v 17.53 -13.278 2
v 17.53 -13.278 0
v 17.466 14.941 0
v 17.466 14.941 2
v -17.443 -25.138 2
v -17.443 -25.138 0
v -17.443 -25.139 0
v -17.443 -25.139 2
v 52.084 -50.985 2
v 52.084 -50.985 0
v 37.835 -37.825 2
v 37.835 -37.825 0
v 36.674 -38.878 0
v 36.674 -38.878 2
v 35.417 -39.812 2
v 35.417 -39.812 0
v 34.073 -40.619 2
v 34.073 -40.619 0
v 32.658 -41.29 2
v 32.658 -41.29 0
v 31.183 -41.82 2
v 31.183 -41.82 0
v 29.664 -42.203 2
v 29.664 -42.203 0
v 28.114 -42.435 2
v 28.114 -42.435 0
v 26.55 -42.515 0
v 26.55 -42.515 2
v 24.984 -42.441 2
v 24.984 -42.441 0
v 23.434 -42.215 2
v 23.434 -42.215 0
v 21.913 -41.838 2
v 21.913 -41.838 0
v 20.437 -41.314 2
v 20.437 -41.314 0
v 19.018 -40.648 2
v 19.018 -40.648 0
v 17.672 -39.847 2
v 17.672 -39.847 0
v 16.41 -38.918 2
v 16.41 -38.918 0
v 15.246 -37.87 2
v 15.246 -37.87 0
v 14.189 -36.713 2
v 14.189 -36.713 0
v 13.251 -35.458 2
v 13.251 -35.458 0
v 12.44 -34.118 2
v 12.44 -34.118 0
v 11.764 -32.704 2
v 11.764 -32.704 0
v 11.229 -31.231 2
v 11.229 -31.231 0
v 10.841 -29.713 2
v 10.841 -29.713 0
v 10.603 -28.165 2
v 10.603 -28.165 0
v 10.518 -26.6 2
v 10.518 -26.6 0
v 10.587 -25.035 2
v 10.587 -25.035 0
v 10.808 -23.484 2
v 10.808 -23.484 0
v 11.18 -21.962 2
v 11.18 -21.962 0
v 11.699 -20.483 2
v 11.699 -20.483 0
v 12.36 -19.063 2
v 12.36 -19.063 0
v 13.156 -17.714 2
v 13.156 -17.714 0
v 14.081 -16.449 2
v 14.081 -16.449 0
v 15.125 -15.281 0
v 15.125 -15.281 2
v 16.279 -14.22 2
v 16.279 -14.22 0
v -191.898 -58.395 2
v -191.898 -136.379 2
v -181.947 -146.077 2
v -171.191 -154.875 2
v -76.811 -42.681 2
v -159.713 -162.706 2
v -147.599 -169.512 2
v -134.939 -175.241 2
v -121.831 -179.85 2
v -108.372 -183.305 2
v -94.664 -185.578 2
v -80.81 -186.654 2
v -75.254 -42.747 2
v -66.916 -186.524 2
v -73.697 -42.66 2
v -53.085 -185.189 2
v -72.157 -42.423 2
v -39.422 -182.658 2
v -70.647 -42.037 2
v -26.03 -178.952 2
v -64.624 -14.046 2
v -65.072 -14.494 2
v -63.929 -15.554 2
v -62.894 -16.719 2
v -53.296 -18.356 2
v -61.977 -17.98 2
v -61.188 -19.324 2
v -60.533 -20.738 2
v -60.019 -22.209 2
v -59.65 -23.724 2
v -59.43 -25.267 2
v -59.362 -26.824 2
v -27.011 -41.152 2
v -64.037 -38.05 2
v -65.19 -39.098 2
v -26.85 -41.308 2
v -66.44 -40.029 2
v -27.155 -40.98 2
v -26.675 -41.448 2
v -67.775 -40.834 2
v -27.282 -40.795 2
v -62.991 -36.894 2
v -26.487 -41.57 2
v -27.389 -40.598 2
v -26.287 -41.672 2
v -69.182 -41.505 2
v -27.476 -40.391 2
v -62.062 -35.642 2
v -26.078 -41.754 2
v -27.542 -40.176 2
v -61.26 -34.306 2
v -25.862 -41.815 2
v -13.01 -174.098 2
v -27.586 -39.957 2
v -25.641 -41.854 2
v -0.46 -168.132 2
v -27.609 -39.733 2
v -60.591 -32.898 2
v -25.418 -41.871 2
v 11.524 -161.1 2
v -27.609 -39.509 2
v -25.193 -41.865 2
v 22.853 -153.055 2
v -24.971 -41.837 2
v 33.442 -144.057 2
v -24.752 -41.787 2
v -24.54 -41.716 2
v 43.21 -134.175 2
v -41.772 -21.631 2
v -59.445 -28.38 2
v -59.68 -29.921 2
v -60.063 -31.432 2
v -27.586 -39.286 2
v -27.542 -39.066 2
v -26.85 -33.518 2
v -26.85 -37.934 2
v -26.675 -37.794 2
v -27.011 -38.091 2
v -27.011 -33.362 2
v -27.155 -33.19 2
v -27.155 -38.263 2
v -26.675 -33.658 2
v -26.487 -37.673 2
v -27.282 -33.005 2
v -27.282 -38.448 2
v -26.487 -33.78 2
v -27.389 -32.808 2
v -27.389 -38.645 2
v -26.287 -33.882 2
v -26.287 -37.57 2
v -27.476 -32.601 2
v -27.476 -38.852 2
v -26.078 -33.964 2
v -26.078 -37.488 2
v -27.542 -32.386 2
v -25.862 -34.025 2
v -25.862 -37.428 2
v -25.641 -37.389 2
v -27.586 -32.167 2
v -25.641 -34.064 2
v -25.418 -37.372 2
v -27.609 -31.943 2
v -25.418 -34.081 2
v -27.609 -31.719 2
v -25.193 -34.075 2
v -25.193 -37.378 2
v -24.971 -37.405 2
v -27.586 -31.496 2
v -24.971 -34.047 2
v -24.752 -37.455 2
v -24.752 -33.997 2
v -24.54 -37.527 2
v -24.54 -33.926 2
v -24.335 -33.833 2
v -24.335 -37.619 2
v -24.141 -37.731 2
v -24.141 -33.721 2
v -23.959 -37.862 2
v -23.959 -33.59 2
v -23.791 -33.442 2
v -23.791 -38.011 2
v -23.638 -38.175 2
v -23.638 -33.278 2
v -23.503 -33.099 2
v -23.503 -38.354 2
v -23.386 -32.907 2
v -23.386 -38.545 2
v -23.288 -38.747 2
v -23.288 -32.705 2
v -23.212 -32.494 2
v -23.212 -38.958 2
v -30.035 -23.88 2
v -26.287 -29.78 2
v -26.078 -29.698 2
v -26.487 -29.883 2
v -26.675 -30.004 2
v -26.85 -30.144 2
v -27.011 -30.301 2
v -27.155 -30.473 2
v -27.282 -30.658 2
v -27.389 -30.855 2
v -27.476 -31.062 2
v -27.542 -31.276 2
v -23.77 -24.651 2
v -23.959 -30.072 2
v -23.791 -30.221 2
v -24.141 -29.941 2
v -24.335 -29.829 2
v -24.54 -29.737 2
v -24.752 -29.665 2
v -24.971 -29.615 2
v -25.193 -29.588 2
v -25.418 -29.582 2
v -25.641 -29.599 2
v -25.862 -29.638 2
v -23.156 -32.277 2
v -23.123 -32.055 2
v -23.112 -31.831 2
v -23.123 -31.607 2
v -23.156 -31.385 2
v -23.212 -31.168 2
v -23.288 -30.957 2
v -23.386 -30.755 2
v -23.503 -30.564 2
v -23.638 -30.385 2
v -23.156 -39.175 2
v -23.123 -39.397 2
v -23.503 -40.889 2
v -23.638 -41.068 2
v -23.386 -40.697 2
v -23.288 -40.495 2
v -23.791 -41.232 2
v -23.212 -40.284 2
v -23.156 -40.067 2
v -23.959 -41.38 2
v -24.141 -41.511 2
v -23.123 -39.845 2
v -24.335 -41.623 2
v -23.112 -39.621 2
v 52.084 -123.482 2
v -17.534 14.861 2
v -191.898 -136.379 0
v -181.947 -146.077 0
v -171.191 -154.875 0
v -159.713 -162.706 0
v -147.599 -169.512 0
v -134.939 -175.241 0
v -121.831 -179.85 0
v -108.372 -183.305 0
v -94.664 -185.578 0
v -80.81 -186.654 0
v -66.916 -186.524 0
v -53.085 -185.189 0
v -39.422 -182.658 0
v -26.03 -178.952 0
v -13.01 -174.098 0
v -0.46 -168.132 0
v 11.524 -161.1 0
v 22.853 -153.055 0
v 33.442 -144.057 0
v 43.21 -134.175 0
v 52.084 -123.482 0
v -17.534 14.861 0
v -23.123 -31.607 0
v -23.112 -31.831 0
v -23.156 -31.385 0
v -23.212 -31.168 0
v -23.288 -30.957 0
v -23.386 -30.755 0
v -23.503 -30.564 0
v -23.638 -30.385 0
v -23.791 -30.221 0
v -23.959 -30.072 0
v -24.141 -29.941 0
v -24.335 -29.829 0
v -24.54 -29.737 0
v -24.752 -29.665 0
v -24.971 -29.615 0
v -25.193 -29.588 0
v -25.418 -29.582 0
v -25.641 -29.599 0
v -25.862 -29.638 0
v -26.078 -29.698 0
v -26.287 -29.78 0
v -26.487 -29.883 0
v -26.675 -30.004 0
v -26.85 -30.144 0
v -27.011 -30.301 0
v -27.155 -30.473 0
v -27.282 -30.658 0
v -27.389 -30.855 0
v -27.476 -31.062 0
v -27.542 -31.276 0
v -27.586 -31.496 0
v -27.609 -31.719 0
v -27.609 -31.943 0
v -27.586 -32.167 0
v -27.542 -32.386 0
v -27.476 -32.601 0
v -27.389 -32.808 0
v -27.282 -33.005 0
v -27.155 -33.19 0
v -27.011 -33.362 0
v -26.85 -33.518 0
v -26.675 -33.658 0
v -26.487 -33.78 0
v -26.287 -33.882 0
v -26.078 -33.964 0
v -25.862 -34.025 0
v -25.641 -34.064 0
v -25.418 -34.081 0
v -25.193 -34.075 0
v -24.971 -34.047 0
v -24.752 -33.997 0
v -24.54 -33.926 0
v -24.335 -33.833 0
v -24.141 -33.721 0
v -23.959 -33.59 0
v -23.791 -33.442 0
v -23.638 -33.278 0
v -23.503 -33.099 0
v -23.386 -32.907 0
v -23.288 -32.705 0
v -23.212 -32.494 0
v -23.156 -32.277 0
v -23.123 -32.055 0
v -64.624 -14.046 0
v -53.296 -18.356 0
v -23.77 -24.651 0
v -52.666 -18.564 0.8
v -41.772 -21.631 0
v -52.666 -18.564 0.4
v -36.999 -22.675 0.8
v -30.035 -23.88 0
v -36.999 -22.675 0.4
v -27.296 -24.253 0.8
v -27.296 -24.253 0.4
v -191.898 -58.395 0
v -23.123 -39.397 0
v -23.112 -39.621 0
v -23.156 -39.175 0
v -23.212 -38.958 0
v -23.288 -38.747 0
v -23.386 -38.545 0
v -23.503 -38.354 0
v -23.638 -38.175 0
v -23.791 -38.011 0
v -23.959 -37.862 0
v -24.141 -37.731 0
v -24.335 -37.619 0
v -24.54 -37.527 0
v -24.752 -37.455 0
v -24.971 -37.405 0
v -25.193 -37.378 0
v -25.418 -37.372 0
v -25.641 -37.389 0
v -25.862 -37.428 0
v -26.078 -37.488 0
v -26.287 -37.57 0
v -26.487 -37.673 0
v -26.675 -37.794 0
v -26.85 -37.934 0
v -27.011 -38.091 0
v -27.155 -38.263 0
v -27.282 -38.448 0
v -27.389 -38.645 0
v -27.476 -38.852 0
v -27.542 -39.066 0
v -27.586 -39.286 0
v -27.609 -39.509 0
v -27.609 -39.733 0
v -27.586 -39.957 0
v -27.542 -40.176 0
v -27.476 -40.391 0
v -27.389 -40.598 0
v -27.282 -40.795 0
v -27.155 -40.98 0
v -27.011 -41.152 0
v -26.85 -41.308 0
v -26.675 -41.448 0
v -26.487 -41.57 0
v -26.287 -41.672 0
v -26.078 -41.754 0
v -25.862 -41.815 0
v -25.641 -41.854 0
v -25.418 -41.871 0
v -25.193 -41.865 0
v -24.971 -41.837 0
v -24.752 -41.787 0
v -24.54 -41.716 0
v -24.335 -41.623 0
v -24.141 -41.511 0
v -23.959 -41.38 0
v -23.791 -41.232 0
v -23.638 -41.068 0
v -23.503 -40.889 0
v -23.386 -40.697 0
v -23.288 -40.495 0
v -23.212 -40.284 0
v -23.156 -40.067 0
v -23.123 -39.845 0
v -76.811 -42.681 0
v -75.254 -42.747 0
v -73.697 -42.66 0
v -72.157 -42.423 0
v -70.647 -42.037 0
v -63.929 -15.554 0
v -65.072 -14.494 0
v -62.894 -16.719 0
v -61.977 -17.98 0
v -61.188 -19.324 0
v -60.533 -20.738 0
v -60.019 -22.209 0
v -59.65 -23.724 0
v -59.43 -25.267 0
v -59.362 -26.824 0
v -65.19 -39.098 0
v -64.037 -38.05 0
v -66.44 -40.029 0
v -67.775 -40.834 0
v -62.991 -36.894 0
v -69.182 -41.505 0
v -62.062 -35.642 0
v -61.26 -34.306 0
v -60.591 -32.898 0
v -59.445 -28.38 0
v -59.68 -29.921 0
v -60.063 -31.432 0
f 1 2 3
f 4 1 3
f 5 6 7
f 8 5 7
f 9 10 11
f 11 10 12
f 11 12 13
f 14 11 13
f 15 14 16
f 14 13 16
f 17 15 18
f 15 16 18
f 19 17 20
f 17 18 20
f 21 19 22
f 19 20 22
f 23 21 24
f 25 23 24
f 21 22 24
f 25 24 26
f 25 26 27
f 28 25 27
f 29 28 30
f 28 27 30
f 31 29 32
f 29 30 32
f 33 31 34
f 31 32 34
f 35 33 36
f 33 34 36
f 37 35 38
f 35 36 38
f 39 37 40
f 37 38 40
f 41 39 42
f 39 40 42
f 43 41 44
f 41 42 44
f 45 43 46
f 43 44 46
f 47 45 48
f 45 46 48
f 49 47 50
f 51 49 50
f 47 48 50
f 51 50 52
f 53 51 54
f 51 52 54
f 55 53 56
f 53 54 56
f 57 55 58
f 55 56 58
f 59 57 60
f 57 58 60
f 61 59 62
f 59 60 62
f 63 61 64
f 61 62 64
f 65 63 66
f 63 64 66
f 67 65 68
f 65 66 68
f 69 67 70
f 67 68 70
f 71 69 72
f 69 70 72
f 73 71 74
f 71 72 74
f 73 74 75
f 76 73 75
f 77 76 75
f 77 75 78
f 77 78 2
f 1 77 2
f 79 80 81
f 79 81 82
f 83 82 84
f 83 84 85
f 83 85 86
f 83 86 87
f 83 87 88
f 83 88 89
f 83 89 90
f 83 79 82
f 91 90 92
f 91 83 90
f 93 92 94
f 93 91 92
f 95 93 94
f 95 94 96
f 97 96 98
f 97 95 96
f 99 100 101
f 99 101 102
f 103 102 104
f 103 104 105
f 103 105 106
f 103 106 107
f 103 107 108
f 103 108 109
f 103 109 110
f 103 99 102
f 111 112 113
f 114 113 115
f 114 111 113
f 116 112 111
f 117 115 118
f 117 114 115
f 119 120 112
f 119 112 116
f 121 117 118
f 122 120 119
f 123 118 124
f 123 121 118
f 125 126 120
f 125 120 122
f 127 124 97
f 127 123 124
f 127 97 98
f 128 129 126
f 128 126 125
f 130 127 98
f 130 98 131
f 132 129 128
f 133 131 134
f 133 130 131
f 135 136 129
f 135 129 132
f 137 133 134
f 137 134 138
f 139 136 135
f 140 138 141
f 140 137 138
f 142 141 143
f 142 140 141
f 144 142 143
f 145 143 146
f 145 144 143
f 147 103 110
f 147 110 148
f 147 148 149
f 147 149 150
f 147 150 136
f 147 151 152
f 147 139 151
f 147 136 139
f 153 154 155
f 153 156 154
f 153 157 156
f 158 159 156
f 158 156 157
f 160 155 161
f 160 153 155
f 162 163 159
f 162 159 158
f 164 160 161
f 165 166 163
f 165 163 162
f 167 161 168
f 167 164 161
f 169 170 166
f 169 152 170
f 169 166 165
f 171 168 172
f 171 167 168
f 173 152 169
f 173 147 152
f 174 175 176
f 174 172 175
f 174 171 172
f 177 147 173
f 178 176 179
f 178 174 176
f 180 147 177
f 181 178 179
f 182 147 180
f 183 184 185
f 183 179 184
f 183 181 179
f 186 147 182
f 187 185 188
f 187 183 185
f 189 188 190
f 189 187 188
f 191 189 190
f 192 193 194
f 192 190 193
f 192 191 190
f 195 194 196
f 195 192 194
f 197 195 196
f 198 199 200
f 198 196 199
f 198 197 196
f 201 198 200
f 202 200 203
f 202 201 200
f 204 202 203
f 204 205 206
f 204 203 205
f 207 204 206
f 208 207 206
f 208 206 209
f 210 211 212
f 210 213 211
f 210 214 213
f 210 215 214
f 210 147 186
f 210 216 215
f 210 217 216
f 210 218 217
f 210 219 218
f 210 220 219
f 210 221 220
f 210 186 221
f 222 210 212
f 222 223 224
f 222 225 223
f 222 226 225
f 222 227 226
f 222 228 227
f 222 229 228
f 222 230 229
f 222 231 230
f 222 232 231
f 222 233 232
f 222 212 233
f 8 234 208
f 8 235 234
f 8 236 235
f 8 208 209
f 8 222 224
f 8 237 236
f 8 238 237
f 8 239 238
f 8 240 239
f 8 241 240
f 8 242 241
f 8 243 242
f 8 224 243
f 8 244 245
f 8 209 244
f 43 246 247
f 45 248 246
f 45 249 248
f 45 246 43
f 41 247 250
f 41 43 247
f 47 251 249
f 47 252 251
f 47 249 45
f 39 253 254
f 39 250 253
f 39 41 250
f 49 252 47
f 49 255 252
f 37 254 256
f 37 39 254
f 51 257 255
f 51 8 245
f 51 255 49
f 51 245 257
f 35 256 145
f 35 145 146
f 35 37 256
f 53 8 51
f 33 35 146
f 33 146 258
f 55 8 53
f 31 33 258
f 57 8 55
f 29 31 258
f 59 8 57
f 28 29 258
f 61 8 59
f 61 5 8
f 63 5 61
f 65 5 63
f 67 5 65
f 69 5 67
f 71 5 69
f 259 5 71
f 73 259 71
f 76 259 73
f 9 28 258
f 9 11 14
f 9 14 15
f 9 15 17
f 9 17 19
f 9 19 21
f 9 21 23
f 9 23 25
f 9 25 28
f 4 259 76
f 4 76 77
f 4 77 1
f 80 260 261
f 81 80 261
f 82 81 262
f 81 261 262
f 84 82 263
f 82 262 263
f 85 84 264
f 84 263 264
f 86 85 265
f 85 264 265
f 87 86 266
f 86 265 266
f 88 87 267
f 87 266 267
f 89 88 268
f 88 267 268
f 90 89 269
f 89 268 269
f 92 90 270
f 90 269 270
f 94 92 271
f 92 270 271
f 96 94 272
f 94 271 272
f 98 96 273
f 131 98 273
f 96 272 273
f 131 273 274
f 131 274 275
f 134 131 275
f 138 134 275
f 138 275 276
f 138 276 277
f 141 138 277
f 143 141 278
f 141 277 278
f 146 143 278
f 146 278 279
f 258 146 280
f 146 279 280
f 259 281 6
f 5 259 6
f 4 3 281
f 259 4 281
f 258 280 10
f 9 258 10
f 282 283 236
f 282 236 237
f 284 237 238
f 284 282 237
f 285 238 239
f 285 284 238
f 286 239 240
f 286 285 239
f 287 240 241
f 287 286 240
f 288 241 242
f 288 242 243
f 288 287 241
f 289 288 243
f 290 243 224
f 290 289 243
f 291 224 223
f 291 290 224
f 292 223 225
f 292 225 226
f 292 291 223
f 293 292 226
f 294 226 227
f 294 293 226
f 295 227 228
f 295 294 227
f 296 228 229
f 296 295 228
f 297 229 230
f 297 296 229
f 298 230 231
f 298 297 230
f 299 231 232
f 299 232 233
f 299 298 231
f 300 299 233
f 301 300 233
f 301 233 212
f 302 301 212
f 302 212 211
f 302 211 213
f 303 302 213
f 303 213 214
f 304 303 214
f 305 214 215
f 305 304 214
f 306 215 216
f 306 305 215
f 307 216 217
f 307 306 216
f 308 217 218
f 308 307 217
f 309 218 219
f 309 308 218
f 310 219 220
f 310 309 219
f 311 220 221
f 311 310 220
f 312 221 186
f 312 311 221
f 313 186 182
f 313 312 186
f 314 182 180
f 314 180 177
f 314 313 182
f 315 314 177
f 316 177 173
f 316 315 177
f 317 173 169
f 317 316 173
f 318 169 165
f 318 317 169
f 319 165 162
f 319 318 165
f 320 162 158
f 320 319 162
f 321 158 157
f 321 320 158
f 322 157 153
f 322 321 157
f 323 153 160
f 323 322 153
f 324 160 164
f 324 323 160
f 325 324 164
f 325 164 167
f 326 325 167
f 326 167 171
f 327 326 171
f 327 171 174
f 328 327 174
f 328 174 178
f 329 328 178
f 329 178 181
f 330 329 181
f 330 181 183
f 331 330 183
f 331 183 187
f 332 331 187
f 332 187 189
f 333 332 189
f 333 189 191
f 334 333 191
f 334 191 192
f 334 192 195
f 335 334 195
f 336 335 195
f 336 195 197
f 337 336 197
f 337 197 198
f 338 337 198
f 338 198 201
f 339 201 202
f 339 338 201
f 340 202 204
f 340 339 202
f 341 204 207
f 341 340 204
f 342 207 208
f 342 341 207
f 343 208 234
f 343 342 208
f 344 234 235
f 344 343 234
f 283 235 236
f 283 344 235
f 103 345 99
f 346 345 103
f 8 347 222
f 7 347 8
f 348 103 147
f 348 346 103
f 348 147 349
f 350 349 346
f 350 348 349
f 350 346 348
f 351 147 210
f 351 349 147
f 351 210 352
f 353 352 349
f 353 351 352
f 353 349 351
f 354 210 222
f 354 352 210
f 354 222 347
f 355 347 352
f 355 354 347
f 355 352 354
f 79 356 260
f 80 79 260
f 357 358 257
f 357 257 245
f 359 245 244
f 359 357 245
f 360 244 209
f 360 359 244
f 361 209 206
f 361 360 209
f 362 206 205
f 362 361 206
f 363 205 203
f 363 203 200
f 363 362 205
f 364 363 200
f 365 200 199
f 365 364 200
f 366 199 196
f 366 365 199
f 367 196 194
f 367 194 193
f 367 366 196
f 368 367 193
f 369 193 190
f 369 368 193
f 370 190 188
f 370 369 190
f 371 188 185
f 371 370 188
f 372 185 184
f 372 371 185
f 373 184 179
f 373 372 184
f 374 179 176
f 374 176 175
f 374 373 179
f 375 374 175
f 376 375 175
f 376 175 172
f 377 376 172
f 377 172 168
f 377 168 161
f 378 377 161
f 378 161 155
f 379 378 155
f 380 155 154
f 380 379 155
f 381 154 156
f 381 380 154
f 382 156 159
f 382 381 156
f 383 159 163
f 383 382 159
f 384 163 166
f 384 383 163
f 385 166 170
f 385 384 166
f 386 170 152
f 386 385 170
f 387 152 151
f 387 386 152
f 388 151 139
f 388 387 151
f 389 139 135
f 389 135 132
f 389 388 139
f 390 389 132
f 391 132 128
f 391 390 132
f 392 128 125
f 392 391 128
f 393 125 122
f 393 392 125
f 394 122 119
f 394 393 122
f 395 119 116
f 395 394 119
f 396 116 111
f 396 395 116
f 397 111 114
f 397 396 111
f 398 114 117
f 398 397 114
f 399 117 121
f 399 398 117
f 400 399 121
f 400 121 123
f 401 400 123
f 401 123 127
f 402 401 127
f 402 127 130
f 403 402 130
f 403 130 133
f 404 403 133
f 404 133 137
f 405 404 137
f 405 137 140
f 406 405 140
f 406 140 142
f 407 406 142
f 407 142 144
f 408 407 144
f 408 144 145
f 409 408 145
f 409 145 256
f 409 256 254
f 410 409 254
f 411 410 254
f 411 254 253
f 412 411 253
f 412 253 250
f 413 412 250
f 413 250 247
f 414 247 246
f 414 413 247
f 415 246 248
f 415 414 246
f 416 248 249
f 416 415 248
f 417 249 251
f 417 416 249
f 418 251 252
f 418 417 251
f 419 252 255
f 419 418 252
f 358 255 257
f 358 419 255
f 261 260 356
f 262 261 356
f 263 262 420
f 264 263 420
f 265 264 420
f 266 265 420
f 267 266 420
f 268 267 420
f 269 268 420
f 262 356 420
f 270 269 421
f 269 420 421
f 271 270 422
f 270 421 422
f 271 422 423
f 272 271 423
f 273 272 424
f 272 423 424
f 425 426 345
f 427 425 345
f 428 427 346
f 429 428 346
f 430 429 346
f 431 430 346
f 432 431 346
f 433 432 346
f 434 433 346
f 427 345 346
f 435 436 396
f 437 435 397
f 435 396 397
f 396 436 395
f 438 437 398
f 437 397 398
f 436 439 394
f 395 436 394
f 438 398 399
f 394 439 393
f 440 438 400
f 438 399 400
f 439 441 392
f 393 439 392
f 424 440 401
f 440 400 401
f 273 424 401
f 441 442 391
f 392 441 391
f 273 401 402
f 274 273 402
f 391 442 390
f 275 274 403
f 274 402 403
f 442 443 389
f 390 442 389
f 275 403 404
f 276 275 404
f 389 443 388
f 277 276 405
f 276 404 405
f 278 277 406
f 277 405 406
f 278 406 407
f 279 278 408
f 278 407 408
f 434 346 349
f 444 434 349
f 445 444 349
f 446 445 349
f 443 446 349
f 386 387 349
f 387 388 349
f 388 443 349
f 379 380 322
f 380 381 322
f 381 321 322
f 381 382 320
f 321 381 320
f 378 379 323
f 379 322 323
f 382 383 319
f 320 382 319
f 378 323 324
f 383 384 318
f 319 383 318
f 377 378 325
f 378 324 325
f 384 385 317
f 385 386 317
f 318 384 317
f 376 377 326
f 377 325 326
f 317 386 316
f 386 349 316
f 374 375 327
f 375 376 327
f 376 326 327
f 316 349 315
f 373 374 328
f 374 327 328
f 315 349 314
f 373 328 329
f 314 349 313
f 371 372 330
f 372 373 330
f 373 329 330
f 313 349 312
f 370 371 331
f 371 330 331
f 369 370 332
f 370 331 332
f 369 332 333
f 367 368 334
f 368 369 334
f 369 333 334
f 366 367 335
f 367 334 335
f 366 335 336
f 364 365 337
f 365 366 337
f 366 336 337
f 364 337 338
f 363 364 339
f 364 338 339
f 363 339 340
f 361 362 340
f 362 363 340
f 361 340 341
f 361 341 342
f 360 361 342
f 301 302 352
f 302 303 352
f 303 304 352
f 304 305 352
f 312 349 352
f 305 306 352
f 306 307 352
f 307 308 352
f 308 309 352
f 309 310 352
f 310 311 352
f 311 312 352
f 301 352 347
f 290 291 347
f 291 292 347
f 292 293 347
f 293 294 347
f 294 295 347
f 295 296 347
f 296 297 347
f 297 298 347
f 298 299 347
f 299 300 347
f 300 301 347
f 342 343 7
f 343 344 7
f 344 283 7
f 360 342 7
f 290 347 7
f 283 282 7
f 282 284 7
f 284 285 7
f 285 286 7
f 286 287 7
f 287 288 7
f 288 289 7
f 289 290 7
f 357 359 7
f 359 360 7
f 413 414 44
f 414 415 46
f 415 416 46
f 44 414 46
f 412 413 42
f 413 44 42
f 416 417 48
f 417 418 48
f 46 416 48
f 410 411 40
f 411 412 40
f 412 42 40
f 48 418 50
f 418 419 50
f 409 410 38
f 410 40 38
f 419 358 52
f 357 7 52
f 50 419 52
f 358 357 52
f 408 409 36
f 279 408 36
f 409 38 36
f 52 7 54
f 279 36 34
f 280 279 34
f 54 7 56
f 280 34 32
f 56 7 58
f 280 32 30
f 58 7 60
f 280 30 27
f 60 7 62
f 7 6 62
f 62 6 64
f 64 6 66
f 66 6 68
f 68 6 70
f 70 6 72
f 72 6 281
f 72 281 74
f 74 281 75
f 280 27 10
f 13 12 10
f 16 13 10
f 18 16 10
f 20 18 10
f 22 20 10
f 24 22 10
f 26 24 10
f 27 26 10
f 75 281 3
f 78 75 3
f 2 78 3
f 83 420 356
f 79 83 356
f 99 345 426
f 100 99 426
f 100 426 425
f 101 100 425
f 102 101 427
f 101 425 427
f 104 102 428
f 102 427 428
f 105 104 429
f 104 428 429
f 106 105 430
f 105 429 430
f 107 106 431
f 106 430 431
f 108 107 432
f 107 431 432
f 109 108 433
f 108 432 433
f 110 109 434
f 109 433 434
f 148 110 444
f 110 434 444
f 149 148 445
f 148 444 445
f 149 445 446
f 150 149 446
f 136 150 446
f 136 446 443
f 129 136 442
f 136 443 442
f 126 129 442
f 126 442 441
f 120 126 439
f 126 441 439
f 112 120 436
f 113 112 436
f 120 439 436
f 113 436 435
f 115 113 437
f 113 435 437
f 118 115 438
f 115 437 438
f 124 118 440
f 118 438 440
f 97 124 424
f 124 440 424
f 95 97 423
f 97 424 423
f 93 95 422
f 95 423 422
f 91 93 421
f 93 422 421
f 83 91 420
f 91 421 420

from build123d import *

# Parameters (mm, degrees)
SKETCH1_R           = 2.25
BOSS_EXTRUDE1_DEPTH = 2


with BuildPart() as part:
    # Sketch1 → Boss-Extrude1 (new body)
    with BuildSketch(Plane.XY):
        with BuildLine():
            ThreePointArc((-65.072201119, -14.494287215), (-60.59129068, -32.898192856), (-76.810886122, -42.68118958))
            Line((-76.810886122, -42.68118958), (-191.898124009, -58.394928446))
            Line((-191.898124009, -58.394928446), (-191.898124009, -58.897796779))
            Line((-191.898124009, -58.897796779), (-191.898124009, -136.379261887))
            ThreePointArc((-191.898124009, -136.379261887), (-66.915619532, -186.523885549), (52.083721608, -123.48210166))
            Line((52.083721608, -123.48210166), (52.083721608, -50.984586674))
            Line((52.083721608, -50.984586674), (37.834963232, -37.825461025))
            ThreePointArc((37.834963232, -37.825461025), (14.189227202, -36.712872143), (17.530284751, -13.277940505))
            Line((17.530284751, -13.277940505), (17.466018163, 14.941165213))
            Line((17.466018163, 14.941165213), (-17.533981861, 14.861463987))
            Line((-17.533981861, 14.861463987), (-17.442886515, -25.137999382))
            Line((-17.442886515, -25.137999382), (-17.442885293, -25.138536013))
            add(Edge.make_bspline(
                [(-64.623988745, -14.046074897), (-63.208317509, -14.654705213), (-59.235254763, -16.288548622), (-52.683559955, -18.641296662), (-44.896066709, -20.933273776), (-33.264108999, -23.619131202), (-24.061605806, -24.778728303), (-17.442885293, -25.138536013)],
                knots=[0.054790311, 0.054790311, 0.054790311, 0.054790311, 0.119867337, 0.236316132, 0.352764926, 0.46921372, 0.751953645, 0.751953645, 0.751953645, 0.751953645], degree=3))
            Line((-64.623988745, -14.046074897), (-65.072201119, -14.494287215))
        make_face()
        with Locations((-25.361610976, -39.621277184)):
            Circle(SKETCH1_R, mode=Mode.SUBTRACT)
        with Locations((-25.361610976, -31.831277184)):
            Circle(SKETCH1_R, mode=Mode.SUBTRACT)
    extrude(amount=BOSS_EXTRUDE1_DEPTH)


solid = part.part
